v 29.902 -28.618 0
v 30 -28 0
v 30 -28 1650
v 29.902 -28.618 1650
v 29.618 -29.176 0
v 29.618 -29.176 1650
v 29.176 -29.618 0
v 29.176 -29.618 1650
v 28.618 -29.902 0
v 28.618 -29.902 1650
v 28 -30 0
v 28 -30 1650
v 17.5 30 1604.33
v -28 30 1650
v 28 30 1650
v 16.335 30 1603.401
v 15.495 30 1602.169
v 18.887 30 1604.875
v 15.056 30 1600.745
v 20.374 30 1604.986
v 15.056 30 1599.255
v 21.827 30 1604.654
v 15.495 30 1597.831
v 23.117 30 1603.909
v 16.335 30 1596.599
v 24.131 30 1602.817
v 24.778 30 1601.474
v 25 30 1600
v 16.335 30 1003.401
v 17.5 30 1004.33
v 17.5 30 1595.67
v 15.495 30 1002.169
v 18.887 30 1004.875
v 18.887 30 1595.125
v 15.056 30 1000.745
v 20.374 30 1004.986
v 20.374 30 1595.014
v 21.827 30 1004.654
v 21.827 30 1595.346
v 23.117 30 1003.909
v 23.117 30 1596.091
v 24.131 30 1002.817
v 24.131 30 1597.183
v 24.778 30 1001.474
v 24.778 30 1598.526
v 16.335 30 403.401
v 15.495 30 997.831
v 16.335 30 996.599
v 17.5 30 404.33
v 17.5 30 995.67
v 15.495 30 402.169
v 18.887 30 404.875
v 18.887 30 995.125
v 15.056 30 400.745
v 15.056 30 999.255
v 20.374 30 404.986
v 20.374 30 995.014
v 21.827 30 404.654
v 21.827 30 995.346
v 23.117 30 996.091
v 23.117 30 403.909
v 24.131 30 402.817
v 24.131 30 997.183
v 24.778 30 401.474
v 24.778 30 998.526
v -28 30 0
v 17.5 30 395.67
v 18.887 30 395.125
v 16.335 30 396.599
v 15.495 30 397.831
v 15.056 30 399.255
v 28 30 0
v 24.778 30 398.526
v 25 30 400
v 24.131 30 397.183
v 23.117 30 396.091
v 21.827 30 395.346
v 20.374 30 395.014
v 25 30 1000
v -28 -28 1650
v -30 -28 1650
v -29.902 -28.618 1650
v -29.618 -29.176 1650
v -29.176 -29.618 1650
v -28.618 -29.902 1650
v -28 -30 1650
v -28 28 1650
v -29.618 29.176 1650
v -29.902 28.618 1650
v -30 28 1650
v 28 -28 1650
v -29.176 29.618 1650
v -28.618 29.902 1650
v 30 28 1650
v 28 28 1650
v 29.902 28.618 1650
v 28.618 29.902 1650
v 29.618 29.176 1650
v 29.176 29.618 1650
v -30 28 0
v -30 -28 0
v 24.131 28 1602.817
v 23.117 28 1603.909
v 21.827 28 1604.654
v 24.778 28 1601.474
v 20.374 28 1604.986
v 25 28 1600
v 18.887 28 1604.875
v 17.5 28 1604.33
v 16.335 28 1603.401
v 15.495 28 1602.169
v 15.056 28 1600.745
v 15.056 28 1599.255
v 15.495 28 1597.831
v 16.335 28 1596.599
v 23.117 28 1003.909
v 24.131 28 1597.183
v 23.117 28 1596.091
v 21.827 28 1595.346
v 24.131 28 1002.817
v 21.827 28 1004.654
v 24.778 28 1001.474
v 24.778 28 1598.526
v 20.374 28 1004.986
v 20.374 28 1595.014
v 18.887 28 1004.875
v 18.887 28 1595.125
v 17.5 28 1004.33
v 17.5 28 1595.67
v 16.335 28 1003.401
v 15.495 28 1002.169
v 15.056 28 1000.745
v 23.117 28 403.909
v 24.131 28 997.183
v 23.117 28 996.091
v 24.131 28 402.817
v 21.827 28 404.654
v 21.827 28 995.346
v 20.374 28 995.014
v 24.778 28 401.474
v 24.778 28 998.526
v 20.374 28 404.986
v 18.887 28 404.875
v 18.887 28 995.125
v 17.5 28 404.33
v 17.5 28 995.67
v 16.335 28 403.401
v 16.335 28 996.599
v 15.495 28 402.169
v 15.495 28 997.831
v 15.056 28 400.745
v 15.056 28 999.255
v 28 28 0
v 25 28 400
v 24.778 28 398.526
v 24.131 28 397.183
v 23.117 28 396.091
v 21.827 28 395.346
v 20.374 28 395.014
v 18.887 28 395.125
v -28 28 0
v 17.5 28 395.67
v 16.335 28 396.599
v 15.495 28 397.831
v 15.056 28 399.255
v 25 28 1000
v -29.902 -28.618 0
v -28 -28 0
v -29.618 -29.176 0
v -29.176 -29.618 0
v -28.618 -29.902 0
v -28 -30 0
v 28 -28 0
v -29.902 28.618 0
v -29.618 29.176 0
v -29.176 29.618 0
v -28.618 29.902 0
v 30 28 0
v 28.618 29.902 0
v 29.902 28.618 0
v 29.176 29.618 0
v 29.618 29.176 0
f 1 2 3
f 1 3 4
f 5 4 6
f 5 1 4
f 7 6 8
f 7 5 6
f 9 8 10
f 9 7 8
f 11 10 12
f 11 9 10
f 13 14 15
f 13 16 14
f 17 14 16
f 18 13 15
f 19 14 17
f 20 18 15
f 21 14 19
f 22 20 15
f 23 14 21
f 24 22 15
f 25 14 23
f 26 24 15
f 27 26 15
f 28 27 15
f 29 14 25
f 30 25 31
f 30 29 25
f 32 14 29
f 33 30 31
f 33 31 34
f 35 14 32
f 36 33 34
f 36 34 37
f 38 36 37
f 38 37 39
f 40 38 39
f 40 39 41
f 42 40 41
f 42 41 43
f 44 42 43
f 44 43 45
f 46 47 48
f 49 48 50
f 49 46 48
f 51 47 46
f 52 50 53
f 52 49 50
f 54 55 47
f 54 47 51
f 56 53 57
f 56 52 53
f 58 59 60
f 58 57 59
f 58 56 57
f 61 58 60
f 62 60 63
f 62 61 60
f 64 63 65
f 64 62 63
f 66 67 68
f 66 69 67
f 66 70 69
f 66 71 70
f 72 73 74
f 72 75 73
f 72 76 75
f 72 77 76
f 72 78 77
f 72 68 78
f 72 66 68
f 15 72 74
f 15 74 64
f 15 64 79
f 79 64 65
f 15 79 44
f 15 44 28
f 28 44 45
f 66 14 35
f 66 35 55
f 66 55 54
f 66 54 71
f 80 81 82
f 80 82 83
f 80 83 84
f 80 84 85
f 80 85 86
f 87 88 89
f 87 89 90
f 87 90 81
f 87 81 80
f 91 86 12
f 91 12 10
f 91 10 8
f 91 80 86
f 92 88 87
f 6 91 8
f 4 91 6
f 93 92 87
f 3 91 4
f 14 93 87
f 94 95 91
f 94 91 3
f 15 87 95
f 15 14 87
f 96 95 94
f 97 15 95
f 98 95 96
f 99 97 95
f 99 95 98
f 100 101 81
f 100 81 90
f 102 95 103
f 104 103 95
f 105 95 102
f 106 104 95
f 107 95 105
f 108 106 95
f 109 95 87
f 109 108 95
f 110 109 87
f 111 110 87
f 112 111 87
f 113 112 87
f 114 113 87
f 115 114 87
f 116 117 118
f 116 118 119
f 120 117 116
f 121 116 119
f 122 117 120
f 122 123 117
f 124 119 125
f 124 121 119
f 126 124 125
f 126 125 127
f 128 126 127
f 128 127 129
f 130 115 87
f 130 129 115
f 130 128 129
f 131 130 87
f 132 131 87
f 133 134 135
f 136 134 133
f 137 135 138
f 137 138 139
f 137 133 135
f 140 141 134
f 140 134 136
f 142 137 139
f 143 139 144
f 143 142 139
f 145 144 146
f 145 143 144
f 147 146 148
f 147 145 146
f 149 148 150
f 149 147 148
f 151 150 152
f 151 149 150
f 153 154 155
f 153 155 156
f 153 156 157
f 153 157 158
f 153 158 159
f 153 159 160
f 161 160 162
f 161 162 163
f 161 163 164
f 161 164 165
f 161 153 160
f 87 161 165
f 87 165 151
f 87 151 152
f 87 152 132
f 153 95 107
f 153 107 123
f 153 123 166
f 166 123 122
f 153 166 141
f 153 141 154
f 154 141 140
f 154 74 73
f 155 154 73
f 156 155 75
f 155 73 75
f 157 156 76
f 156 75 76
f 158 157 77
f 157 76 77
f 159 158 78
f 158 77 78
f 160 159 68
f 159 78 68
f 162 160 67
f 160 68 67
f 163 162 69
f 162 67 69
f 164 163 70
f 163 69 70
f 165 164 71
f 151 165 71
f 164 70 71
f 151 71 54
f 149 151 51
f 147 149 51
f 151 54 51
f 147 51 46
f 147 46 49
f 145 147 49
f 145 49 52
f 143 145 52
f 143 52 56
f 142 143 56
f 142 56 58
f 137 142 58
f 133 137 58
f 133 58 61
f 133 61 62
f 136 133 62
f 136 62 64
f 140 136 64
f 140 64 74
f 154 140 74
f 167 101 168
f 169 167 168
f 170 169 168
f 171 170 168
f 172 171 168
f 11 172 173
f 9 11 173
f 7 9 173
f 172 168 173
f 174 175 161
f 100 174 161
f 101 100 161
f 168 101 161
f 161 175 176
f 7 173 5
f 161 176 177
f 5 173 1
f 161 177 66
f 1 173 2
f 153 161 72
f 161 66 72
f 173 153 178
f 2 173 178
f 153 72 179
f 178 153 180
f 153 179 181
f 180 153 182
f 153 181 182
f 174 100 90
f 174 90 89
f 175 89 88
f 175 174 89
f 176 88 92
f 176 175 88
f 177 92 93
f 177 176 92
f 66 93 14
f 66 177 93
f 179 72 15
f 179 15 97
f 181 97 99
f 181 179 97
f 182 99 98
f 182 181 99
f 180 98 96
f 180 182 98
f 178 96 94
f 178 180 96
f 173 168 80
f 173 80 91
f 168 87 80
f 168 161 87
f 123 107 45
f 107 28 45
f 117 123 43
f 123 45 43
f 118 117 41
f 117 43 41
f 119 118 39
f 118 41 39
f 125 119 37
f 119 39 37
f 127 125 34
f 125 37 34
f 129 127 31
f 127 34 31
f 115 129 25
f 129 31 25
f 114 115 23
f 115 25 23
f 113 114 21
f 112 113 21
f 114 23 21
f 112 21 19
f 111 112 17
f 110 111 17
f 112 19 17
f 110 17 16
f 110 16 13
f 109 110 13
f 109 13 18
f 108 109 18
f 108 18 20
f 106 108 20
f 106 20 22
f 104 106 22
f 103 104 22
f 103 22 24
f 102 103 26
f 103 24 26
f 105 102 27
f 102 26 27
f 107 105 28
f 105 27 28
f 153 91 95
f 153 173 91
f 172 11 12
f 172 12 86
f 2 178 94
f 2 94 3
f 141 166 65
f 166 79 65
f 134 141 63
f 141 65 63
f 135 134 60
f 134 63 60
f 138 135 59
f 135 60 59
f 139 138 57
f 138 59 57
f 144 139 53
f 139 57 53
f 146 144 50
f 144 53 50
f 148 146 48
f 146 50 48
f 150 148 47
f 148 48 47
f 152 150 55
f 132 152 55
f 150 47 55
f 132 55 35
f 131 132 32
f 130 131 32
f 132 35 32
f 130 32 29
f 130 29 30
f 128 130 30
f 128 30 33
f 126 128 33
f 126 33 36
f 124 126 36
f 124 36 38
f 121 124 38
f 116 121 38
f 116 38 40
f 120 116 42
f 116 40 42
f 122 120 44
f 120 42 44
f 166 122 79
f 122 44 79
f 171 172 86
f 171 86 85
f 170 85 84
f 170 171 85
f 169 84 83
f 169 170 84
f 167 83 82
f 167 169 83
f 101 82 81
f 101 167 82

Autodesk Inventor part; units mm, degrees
ref_plane "YZ Plane" through (0, 0, 0) normal (1, 0, 0) x (0, 1, 0)
ref_plane "XZ Plane" through (0, 0, 0) normal (0, 1, 0) x (-1, 0, 0)
ref_plane "XY Plane" through (0, 0, 0) normal (0, 0, 1) x (1, 0, 0)
sketch "Sketch1" plane through (0, 0, 0) normal (0, 0, 1) x (1, 0, 0)
  line L0 (-28, 30) -> (28, 30)
  line L1 (30, 28) -> (30, -28)
  line L2 (28, -30) -> (-28, -30)
  line L3 (-30, -28) -> (-30, 28)
  line L4 (-30, 30) -> (30, -30) construction
  line L5 (28, 28) -> (-28, 28)
  line L6 (-28, 28) -> (-28, -28)
  line L7 (-28, -28) -> (28, -28)
  line L8 (28, -28) -> (28, 28)
  arc A0 (-28, 30) -> (-30, 28) centre (-28, 28) ccw
  arc A1 (30, 28) -> (28, 30) centre (28, 28) ccw
  arc A2 (28, -30) -> (30, -28) centre (28, -28) ccw
  arc A3 (-30, -28) -> (-28, -30) centre (-28, -28) ccw
  point P0 (0, 0)
  point P1 (30, 30)
  point P2 (-30, -30)
  point P3 (0, 0)
  dimension "d0" = 60
  dimension "d1" = 60
  dimension "d2" = 2
  dimension "d3" = 2
extrude "Extrusion1" add sketch "Sketch1" along normal blind 1650
sketch "Sketch2" plane through (-28, 30, 0) normal (0, 1, 0) x (1, 0, 0)
  circle A0 centre (48, -1000) radius 5
  line L0 (56, -1650) -> (0, -1650) projected
  line L1 (56, 0) -> (0, 0) projected
  circle A1 centre (48, -400) radius 5
  circle A2 centre (48, -1600) radius 5
  line L2 (48, -116) -> (48, -1518) construction
  line L3 (58, 0) -> (58, -1650) projected
  point P0 (28, 0)
  dimension "d6" = 10
  dimension "d10" = 1000
  dimension "d11" = 10
  dimension "d12" = 10
  dimension "d13" = 600
  dimension "d14" = 600
  dimension "d15" = 10
extrude "Extrusion2" cut sketch "Sketch2" against normal up to next
properties part number "TABLE_BERAM" material "Stainless Steel"
